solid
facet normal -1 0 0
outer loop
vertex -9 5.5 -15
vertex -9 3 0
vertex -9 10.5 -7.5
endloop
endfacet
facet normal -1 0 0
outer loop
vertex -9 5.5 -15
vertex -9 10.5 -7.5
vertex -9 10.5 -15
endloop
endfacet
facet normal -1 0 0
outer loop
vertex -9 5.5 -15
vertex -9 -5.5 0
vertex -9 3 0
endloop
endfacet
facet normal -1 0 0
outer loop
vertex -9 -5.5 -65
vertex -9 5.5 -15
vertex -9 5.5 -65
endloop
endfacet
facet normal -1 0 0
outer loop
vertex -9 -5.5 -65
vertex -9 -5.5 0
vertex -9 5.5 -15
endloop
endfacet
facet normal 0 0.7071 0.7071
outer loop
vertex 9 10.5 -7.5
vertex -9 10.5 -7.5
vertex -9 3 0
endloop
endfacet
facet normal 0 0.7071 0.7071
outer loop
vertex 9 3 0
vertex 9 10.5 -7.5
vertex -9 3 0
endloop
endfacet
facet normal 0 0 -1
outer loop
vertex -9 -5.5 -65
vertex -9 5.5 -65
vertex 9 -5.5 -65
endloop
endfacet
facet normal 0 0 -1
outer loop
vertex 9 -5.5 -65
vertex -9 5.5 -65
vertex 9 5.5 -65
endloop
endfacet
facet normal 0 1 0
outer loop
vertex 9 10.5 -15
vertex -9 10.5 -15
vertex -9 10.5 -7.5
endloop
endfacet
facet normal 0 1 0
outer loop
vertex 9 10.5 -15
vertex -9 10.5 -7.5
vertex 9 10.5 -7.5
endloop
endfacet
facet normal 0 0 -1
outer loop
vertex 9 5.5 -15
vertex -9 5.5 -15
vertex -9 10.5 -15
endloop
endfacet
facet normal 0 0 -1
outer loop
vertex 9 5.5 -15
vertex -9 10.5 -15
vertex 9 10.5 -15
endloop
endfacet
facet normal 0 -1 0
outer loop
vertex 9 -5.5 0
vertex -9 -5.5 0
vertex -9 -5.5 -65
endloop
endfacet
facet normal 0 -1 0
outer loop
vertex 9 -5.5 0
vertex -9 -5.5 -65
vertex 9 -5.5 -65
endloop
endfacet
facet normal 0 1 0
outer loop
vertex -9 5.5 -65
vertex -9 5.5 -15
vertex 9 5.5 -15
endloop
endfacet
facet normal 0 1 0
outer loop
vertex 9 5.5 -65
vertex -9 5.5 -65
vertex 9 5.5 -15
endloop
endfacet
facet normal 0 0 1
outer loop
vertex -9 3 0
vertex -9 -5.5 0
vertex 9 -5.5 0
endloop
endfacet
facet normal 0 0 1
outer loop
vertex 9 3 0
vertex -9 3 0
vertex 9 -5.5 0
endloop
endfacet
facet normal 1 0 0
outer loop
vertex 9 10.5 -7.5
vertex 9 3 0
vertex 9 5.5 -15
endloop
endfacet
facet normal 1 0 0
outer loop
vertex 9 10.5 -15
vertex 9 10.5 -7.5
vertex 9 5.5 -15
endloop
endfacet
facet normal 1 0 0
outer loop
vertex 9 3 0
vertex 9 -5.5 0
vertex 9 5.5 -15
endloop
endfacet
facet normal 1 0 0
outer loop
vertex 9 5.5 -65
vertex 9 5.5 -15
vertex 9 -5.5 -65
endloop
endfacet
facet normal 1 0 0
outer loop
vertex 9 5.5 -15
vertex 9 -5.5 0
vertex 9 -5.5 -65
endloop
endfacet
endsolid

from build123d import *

# Parameters (mm, degrees)
SKETCH1_W           = 18
SKETCH1_H           = 11
BOSS_EXTRUDE1_DEPTH = 65
SKETCH2_W           = 18
SKETCH2_H           = 15
BOSS_EXTRUDE2_DEPTH = 5
CUT_EXTRUDE1_DEPTH  = 69.258699079


with BuildPart() as part:
    # Sketch1 → Boss-Extrude1 (new body)
    with BuildSketch(Plane.XY):
        Rectangle(SKETCH1_W, SKETCH1_H)
    extrude(amount=-BOSS_EXTRUDE1_DEPTH)

    # Sketch2 → Boss-Extrude2 (add)
    with BuildSketch(Plane(origin=(0, 5.5, 0), x_dir=(1, 0, 0), z_dir=(0, 1, 0))):
        with Locations((0, 7.5)):
            Rectangle(SKETCH2_W, SKETCH2_H)
    extrude(amount=BOSS_EXTRUDE2_DEPTH)

    # Sketch3 → Cut-Extrude1 (cut, through all)
    with BuildSketch(Plane(origin=(9, 0, 0), x_dir=(0, 0, -1), z_dir=(1, 0, 0))):
        Polygon((7.5, 10.5), (0, 3), (0, 10.5), align=None)
    extrude(amount=-CUT_EXTRUDE1_DEPTH, mode=Mode.SUBTRACT)


solid = part.part
